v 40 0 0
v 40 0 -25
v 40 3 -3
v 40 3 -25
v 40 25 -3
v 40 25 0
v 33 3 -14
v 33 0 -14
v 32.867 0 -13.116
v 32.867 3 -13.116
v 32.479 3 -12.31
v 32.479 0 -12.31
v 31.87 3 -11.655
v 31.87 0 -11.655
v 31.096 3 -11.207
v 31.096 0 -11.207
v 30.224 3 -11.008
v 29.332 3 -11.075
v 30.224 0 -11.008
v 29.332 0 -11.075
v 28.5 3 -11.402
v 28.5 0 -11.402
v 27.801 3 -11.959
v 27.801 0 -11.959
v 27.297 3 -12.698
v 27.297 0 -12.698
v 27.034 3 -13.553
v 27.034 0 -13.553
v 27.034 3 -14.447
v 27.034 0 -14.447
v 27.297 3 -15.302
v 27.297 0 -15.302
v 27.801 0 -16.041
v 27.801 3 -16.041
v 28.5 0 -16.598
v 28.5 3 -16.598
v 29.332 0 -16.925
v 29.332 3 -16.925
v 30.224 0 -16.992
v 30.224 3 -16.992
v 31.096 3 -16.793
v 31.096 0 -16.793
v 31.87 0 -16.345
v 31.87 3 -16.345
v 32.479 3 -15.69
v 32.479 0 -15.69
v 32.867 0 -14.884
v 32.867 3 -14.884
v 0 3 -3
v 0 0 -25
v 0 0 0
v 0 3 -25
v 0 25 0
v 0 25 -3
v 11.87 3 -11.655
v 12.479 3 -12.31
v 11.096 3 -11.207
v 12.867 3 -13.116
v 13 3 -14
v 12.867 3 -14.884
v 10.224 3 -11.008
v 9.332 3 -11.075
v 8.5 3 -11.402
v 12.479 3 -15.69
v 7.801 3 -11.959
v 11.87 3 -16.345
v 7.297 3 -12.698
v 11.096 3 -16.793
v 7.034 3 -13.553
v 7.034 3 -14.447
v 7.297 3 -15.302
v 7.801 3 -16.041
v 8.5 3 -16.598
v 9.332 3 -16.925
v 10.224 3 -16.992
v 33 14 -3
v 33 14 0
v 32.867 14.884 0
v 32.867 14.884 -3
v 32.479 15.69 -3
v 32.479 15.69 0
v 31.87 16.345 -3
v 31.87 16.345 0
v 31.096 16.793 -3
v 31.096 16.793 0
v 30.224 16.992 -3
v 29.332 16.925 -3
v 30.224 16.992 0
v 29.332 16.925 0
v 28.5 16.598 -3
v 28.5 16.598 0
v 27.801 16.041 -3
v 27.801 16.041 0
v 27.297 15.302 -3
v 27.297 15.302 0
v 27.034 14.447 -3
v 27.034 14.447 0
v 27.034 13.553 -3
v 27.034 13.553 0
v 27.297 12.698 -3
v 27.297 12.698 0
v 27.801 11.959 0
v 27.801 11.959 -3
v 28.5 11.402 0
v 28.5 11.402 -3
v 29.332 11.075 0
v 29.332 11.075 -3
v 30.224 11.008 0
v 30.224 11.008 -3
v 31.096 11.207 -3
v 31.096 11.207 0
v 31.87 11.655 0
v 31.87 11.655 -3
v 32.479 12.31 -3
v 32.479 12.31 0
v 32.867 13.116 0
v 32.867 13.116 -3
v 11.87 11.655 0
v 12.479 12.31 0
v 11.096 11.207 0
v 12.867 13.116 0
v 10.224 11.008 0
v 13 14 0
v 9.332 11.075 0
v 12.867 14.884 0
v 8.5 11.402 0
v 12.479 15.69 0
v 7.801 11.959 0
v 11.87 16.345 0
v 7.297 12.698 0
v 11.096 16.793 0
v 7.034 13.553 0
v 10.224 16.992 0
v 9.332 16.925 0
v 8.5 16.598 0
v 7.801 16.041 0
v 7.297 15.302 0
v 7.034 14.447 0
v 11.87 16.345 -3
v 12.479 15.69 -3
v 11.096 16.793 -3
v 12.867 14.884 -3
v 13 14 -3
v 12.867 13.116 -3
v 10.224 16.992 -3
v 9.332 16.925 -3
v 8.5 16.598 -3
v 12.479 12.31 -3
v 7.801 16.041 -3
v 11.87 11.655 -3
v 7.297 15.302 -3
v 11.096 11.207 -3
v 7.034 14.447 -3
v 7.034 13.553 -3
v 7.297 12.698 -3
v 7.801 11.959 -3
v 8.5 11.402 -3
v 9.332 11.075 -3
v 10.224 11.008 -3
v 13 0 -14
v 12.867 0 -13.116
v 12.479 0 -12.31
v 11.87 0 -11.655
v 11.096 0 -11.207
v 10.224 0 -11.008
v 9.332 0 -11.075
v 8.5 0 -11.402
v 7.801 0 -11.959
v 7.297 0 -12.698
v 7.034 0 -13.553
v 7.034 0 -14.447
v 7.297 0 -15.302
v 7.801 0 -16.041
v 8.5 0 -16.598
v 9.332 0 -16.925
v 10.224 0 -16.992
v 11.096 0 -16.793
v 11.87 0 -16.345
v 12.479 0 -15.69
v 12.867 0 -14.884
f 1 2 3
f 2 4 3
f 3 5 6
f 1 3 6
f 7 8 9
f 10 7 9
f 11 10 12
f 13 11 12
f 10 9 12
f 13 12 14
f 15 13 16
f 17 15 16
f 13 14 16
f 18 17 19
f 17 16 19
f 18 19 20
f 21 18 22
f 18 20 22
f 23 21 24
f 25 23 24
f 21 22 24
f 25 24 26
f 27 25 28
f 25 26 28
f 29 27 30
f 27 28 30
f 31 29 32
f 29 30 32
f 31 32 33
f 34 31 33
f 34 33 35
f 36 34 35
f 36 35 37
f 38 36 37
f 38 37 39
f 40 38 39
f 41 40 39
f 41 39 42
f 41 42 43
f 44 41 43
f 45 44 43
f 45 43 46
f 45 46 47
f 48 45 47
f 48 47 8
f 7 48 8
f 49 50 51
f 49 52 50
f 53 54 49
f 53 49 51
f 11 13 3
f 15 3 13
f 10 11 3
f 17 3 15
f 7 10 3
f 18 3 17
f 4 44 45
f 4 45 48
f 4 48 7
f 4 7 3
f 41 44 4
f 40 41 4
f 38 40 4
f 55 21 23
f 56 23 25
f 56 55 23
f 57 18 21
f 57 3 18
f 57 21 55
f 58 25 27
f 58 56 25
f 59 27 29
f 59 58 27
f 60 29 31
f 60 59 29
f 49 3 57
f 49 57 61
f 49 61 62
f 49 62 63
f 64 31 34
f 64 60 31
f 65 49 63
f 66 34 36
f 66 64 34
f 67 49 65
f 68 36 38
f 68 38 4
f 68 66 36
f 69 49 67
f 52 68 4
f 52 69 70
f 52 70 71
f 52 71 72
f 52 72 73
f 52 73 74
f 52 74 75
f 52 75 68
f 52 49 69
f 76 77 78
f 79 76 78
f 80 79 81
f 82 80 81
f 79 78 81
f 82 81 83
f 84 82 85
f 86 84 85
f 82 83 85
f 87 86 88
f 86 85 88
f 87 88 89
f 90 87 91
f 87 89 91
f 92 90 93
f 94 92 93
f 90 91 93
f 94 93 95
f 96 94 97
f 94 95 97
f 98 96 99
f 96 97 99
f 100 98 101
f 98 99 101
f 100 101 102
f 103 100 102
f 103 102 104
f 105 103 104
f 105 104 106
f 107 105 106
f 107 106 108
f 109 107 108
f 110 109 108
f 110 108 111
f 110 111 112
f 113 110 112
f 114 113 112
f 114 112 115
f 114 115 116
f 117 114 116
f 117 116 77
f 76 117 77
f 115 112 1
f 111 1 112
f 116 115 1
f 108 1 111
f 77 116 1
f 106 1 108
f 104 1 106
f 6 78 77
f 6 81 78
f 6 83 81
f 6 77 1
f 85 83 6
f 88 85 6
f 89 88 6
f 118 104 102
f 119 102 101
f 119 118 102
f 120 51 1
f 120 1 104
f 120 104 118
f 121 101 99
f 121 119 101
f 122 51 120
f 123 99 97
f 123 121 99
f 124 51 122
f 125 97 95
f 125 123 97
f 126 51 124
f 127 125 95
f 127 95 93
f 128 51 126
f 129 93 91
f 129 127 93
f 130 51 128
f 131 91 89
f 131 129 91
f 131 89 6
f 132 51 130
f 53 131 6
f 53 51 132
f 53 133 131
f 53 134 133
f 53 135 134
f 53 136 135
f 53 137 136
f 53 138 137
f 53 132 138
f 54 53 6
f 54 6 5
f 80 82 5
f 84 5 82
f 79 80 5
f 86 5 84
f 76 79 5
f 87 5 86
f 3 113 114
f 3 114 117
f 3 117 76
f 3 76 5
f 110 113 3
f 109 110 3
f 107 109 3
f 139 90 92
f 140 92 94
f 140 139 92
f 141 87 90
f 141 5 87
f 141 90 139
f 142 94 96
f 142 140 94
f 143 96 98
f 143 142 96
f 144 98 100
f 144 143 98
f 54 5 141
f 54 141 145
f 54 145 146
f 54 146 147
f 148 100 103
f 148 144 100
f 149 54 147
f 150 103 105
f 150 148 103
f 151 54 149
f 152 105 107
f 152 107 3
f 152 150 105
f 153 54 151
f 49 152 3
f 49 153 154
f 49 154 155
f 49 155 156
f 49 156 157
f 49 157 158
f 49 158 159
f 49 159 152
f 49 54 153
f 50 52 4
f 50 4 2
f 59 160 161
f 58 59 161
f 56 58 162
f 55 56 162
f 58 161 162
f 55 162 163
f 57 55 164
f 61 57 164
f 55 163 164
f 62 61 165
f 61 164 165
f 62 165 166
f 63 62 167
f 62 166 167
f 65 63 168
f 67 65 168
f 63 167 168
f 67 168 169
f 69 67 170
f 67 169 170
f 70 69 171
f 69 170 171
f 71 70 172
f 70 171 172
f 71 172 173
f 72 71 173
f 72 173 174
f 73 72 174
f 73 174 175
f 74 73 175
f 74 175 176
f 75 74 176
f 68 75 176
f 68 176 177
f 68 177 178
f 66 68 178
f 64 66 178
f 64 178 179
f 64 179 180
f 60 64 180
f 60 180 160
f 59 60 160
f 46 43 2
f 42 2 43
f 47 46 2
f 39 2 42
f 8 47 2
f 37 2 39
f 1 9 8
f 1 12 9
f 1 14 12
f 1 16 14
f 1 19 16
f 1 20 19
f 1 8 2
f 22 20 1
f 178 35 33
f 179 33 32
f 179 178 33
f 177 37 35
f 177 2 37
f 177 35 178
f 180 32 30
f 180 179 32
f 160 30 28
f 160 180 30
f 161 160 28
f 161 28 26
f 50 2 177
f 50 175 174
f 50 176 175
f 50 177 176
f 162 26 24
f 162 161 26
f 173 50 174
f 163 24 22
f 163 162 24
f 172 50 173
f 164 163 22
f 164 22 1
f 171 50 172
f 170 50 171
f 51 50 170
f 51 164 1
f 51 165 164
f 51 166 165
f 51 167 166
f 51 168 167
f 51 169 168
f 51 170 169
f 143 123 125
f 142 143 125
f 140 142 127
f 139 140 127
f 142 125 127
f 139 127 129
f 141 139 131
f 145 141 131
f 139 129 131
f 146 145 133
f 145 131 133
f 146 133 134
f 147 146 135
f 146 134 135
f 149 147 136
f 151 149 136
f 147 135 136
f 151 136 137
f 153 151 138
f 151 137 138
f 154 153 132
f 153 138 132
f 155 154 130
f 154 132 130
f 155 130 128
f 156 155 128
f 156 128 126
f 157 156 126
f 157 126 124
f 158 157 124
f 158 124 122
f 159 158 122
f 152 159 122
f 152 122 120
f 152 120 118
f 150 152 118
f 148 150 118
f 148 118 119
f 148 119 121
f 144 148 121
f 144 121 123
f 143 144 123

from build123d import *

# Parameters (mm, degrees)
EXTRUDE_1_DEPTH     = 40
SKETCH_2_R          = 3
CUT_EXTRUDE_1_DEPTH = 10
SKETCH_3_R          = 3
CUT_EXTRUDE_2_DEPTH = 10


with BuildPart() as part:
    # Эскиз1 → Вытянуть-Тонкостенный1 (new body)
    with BuildSketch(Plane(origin=(0, 0, 0), x_dir=(0, 0, -1), z_dir=(1, 0, 0))):
        Polygon((25, 0), (0, 0), (0, 25), (3, 25), (3, 3), (25, 3), align=None)
    extrude(amount=EXTRUDE_1_DEPTH)

    # Эскиз2 → Вырез-Вытянуть1 (cut)
    with BuildSketch(Plane.XZ):
        with Locations((10, -14)):
            Circle(SKETCH_2_R)
        with Locations((30, -14)):
            Circle(SKETCH_2_R)
    extrude(amount=-CUT_EXTRUDE_1_DEPTH, mode=Mode.SUBTRACT)

    # Эскиз3 → Вырез-Вытянуть2 (cut)
    with BuildSketch(Plane.XY):
        with Locations((10, 14)):
            Circle(SKETCH_3_R)
        with Locations((30, 14)):
            Circle(SKETCH_3_R)
    extrude(amount=-CUT_EXTRUDE_2_DEPTH, mode=Mode.SUBTRACT)


solid = part.part
